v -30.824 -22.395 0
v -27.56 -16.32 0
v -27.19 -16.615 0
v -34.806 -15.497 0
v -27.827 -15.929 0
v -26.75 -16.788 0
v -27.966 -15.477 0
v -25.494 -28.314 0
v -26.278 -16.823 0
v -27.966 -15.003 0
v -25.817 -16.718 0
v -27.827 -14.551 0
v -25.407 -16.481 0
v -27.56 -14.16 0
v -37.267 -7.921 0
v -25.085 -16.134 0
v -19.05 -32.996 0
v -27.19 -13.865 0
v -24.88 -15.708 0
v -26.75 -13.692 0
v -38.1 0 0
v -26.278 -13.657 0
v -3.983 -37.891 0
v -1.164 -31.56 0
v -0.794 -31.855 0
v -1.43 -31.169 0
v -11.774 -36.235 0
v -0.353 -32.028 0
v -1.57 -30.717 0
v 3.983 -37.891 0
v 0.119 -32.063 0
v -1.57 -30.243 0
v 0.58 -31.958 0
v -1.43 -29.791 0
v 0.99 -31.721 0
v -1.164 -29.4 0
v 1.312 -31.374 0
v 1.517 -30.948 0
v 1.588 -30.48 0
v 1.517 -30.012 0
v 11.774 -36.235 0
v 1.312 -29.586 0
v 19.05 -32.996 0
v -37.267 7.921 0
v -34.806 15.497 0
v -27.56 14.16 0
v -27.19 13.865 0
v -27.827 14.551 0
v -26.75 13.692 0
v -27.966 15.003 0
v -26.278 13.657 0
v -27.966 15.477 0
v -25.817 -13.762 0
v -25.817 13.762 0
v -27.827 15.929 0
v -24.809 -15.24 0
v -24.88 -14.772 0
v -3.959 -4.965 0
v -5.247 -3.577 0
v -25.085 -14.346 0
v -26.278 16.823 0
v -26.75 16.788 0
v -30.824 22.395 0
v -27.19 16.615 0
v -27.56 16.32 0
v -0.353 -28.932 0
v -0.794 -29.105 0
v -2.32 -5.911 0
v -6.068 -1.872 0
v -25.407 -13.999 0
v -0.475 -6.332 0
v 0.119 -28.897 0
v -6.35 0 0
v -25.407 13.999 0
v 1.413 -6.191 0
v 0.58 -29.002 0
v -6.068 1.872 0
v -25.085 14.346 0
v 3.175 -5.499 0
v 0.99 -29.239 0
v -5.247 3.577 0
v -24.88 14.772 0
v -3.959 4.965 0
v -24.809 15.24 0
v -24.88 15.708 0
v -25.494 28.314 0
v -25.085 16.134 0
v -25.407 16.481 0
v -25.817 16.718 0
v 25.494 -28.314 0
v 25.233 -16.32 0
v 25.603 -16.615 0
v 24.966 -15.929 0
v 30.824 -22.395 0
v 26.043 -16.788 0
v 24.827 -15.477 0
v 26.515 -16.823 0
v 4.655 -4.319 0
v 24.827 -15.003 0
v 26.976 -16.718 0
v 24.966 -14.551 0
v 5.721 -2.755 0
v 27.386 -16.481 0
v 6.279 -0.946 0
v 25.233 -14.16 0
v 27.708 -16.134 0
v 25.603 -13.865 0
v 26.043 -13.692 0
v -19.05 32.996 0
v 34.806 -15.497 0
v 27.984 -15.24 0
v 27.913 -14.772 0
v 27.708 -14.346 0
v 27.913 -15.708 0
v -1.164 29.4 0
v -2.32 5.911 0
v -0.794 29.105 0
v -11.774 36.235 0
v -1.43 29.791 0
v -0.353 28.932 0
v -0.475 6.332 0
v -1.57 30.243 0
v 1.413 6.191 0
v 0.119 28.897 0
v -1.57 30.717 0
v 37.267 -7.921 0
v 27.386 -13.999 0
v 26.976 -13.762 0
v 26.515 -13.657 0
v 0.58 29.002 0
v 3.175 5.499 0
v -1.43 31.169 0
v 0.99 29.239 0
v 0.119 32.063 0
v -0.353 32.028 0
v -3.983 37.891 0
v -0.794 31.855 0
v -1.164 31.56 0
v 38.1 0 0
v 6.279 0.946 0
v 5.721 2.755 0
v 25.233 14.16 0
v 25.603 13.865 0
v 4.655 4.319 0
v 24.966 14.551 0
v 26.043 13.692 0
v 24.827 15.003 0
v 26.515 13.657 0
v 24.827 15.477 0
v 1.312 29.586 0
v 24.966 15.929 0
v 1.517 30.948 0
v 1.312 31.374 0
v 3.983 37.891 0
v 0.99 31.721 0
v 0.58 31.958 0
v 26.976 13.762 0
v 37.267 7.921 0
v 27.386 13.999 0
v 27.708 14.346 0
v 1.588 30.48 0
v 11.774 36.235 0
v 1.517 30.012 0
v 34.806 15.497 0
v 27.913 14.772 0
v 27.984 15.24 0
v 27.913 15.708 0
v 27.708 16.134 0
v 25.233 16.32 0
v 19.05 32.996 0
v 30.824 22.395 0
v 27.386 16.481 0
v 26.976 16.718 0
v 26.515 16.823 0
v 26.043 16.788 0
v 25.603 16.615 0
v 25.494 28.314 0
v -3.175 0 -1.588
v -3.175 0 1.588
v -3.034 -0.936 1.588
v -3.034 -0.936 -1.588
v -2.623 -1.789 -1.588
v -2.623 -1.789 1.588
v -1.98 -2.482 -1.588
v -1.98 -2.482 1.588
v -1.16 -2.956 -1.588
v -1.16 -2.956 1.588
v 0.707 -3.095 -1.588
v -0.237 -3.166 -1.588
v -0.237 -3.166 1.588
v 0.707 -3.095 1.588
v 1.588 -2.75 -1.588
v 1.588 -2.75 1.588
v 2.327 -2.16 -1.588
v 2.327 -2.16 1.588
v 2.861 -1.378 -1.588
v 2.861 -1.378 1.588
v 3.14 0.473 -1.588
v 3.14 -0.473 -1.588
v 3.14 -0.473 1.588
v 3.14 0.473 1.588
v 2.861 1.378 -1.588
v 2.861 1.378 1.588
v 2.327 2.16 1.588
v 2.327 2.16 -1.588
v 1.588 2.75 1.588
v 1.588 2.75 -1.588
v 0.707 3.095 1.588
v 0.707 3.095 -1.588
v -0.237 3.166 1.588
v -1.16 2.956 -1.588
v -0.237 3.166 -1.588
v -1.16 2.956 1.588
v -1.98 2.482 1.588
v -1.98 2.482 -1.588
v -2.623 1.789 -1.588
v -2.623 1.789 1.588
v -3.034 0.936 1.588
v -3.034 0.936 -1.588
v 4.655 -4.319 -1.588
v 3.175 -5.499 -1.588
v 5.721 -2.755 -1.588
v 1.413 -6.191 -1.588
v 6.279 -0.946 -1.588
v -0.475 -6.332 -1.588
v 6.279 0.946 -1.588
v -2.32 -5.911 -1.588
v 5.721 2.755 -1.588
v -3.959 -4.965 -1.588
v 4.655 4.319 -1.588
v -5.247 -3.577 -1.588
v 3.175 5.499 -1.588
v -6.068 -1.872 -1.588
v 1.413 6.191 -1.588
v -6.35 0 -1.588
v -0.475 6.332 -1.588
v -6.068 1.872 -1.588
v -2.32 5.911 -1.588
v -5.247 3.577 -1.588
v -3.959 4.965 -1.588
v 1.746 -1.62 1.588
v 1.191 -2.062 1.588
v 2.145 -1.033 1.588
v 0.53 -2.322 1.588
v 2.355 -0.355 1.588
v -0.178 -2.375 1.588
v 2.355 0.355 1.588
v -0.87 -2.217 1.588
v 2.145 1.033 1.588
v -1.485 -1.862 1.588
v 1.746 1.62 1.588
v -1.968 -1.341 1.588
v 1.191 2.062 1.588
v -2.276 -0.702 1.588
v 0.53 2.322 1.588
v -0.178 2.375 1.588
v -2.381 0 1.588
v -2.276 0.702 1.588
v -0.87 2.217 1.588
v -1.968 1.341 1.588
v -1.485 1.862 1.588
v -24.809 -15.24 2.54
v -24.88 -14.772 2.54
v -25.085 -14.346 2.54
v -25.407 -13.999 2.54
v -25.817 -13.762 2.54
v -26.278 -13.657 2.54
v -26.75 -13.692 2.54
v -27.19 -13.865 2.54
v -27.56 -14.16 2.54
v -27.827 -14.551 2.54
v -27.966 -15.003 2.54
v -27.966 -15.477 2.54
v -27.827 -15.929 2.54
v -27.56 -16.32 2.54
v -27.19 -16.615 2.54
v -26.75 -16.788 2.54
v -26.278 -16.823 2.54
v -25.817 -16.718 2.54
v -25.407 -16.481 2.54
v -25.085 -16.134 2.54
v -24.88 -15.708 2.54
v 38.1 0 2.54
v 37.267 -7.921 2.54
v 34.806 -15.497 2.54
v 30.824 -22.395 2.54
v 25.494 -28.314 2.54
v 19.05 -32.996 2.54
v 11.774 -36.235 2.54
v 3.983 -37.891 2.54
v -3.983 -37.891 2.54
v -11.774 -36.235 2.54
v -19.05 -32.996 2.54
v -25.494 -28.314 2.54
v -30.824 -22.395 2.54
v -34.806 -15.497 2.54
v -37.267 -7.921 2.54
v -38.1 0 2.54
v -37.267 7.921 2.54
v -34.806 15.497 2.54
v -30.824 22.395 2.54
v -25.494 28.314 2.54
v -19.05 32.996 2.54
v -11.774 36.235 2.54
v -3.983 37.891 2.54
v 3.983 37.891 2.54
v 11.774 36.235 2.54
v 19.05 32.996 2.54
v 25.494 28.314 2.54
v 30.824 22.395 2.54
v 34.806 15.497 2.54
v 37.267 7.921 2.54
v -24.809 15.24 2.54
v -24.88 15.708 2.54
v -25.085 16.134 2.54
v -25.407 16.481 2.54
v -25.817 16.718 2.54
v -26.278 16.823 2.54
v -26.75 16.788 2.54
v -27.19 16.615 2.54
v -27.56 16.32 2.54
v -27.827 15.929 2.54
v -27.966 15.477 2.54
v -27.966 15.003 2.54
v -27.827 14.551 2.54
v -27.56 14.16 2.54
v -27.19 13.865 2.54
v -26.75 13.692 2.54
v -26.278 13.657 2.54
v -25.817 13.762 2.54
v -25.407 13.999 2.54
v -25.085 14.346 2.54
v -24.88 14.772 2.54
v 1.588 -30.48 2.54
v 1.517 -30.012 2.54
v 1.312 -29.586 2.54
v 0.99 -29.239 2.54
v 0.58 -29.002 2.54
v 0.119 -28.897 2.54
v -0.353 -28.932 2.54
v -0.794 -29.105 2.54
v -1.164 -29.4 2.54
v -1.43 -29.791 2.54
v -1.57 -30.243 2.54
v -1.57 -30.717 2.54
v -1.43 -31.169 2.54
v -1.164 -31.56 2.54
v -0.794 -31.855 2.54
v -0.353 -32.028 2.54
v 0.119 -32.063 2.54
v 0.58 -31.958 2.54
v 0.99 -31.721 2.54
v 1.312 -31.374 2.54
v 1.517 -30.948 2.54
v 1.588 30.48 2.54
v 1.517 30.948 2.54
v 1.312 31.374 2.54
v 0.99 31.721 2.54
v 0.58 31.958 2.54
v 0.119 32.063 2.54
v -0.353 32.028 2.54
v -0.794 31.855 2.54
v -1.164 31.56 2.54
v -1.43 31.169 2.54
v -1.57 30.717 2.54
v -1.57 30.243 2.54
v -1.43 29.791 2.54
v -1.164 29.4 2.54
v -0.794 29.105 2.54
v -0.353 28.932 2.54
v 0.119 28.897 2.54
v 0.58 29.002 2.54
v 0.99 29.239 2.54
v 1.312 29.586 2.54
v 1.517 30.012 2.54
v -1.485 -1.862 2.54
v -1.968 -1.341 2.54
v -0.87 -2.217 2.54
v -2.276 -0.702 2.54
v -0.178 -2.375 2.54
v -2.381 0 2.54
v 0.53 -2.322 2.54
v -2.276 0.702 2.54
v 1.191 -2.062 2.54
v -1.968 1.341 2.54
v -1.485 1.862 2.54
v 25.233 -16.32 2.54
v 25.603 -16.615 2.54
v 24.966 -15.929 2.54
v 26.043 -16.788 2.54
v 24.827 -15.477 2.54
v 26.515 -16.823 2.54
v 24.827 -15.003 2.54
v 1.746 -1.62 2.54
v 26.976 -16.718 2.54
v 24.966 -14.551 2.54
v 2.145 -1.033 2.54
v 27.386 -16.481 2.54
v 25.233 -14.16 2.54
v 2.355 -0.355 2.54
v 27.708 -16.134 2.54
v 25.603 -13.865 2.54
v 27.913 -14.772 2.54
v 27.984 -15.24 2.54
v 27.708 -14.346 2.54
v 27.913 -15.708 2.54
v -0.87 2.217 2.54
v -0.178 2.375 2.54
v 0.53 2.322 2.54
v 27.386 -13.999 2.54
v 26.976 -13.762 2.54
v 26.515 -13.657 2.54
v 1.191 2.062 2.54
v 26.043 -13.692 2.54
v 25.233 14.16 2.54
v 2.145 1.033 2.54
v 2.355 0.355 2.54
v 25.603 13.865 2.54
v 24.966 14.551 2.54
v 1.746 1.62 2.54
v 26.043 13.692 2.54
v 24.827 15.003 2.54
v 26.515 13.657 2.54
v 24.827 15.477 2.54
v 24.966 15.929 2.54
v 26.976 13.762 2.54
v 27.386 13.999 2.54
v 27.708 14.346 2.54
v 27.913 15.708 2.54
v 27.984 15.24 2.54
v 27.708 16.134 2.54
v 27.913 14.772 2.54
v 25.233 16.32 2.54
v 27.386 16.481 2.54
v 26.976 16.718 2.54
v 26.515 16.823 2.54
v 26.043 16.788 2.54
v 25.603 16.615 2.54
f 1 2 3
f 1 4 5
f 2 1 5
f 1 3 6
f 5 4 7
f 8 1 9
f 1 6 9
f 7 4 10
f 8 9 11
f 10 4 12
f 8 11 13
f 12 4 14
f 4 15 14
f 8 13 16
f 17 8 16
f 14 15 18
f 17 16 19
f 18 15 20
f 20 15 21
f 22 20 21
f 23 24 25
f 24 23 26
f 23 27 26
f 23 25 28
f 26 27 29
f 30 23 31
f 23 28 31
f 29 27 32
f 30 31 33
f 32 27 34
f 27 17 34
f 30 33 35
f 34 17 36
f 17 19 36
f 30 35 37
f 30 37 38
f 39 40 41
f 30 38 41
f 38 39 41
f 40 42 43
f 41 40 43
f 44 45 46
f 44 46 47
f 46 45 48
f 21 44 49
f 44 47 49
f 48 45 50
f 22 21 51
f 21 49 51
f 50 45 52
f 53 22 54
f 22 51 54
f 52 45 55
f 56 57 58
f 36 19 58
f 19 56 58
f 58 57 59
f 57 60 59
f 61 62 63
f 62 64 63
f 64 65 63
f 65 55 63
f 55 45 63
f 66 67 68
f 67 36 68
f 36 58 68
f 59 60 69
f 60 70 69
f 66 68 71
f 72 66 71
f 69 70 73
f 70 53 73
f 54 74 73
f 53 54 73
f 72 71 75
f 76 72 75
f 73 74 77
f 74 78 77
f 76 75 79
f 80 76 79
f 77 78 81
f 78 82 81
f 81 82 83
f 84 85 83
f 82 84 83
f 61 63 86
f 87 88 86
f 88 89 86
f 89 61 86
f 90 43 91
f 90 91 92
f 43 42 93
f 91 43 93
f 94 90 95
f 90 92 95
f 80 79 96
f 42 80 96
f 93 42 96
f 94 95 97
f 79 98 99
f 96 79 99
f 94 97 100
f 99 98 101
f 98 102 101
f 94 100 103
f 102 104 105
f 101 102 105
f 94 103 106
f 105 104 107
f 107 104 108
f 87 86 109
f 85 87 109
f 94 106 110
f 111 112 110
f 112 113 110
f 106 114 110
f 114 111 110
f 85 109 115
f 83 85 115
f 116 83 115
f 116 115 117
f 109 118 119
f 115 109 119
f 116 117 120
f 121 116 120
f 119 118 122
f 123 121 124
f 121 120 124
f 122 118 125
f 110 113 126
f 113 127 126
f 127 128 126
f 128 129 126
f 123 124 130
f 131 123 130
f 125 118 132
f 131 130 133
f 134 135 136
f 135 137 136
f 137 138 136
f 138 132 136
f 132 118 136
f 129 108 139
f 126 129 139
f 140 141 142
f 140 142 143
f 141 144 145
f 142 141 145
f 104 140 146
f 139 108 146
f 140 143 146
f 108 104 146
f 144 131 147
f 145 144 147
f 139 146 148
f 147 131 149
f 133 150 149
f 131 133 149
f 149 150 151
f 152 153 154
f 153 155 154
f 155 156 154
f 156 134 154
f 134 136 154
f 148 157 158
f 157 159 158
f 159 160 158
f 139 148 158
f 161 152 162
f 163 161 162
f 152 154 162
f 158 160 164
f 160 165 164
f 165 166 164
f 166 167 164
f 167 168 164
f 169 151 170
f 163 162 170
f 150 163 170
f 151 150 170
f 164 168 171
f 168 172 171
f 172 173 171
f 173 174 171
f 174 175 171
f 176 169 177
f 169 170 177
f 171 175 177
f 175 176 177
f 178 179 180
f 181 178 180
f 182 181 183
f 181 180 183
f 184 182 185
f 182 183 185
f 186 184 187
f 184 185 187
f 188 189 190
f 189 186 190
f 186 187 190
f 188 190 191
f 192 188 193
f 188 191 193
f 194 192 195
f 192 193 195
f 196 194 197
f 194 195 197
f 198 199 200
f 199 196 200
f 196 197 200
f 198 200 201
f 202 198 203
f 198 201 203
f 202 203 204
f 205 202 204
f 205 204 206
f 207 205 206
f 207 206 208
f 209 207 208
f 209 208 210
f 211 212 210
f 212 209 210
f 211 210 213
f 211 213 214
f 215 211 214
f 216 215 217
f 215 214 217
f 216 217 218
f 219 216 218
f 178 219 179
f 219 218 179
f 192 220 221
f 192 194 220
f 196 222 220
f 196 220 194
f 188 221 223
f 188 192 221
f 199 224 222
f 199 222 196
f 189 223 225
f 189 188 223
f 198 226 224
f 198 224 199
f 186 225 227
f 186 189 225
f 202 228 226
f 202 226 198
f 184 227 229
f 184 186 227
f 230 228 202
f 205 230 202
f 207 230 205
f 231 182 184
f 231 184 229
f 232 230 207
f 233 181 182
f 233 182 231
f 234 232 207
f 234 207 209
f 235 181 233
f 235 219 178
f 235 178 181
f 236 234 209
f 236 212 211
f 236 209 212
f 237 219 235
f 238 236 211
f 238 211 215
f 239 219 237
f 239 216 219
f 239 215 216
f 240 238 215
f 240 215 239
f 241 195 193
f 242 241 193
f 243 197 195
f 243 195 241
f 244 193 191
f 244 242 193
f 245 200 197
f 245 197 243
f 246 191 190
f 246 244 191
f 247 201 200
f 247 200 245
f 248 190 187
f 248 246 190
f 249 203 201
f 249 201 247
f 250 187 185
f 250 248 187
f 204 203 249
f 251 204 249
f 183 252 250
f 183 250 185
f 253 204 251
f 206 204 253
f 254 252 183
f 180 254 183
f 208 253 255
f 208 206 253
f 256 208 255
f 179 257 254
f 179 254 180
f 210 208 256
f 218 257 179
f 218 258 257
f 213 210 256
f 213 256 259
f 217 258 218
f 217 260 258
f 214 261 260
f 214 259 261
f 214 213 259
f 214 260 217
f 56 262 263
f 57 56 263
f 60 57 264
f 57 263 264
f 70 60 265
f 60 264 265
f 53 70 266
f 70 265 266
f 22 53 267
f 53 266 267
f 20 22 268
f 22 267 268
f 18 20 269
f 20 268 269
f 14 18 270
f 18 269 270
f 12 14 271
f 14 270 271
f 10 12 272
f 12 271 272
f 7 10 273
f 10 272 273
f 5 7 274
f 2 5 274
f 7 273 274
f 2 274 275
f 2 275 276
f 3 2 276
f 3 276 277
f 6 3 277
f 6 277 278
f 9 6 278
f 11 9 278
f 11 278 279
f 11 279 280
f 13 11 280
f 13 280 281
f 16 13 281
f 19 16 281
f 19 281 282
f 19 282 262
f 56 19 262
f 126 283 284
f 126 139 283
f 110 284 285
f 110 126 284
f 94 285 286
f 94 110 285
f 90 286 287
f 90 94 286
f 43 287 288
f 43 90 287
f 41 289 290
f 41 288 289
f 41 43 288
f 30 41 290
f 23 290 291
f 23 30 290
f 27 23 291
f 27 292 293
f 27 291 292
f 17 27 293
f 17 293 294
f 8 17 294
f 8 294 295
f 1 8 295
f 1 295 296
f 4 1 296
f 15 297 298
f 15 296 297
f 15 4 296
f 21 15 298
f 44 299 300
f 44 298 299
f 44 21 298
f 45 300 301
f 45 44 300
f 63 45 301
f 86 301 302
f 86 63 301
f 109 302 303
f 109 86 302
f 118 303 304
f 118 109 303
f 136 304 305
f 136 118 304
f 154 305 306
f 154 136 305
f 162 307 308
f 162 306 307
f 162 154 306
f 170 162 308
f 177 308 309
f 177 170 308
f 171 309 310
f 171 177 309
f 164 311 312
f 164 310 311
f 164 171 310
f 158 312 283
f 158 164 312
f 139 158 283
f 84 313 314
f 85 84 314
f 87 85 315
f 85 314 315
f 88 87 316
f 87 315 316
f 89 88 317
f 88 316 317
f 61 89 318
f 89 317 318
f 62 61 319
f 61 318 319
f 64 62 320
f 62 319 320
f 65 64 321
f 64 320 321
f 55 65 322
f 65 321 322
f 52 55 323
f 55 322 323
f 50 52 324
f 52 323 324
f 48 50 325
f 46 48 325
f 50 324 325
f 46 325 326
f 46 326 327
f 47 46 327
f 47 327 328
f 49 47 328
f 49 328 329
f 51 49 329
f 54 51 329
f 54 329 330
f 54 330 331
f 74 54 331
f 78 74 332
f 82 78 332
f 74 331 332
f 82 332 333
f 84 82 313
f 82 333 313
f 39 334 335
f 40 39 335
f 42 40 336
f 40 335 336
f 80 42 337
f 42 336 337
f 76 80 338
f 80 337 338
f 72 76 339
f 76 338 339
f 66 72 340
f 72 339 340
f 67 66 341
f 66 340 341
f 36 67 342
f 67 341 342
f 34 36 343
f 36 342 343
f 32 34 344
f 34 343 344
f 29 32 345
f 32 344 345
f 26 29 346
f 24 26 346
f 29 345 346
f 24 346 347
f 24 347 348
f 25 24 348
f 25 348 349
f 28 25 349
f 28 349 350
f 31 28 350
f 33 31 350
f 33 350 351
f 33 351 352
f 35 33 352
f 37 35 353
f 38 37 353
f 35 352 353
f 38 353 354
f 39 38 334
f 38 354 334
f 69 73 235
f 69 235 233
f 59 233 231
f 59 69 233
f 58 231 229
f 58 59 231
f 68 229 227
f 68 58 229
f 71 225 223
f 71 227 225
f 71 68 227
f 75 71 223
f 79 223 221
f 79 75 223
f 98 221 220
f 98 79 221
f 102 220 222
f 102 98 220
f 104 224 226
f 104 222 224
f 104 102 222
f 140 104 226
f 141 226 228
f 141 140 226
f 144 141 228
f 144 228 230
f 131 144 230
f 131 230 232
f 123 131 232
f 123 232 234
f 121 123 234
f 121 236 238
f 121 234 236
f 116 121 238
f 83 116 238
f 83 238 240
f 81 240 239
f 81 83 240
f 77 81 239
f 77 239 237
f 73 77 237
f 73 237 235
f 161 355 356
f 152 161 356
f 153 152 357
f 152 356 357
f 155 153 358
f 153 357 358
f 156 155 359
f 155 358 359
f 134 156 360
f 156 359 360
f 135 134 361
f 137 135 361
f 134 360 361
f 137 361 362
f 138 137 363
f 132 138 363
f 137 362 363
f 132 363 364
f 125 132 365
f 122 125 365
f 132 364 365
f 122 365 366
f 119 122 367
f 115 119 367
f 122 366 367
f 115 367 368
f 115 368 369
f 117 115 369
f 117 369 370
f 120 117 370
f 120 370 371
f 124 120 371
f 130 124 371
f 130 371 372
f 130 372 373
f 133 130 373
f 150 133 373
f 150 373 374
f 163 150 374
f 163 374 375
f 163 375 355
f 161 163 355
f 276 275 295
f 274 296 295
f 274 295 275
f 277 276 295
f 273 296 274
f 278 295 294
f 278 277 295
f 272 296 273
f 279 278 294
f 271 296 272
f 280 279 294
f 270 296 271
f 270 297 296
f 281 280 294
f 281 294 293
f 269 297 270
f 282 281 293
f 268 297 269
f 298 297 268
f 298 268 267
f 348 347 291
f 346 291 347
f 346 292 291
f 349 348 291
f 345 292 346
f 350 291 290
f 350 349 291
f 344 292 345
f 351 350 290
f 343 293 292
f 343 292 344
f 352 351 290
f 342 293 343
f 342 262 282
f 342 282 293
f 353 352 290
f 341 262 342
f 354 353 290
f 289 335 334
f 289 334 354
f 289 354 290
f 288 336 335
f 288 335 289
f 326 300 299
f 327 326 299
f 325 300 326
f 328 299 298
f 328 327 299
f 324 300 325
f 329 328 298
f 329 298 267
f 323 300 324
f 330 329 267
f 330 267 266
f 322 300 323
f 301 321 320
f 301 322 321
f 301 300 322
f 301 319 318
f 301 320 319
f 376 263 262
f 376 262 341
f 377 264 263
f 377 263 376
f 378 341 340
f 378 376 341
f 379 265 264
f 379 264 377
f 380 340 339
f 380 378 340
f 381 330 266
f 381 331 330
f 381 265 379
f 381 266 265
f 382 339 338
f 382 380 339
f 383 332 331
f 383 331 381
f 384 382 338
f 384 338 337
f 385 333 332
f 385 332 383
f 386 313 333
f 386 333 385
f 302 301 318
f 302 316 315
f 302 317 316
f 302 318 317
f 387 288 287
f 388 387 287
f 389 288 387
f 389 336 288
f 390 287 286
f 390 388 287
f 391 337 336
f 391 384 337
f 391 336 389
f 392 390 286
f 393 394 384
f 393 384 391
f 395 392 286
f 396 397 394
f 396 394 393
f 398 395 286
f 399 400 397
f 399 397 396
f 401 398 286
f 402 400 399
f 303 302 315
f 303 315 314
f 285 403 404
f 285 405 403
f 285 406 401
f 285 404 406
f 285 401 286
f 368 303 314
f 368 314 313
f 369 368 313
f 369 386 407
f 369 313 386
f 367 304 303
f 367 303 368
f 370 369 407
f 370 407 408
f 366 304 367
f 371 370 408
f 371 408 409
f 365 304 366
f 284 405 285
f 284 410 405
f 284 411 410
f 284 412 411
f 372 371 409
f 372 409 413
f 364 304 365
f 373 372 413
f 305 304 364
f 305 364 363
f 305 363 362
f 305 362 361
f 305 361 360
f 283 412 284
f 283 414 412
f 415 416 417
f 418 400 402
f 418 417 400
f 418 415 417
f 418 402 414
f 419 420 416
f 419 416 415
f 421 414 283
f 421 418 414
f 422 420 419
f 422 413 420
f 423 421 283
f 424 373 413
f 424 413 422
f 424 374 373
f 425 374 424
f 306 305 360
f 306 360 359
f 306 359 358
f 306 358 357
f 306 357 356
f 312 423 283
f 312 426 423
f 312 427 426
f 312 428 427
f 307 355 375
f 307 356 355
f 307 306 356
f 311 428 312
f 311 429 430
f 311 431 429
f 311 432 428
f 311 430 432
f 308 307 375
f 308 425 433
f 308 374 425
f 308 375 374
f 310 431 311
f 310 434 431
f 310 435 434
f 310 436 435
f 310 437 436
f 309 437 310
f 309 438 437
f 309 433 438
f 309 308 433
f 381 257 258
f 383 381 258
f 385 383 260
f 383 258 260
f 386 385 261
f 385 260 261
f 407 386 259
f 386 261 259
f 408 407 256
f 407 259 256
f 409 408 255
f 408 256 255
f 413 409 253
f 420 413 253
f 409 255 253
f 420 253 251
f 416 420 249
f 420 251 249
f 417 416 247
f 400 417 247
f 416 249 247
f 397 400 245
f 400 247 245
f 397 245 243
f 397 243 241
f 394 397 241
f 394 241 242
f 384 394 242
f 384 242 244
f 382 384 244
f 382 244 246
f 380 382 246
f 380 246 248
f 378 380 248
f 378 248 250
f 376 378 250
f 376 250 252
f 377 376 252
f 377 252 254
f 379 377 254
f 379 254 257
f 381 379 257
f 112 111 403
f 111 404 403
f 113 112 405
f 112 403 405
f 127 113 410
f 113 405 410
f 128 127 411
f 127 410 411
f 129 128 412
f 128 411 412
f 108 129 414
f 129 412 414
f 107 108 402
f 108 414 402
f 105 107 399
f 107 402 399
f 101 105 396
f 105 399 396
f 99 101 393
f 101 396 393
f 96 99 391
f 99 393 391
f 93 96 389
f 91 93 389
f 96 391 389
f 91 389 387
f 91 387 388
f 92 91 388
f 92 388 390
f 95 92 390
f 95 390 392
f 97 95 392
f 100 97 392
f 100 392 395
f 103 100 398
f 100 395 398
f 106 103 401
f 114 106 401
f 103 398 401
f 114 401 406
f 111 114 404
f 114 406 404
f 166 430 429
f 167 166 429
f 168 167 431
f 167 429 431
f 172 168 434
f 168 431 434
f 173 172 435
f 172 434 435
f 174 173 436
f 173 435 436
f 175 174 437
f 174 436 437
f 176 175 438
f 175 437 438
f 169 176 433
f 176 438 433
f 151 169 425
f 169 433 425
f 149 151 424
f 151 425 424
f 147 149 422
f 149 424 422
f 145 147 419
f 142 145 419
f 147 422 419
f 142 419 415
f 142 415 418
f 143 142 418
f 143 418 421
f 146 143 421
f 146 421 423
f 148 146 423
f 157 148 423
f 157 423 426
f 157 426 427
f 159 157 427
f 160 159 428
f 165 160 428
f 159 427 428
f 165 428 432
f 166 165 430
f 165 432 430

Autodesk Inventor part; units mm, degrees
ref_plane "YZ Plane" through (0, 0, 0) normal (1, 0, 0) x (0, 1, 0)
ref_plane "XZ Plane" through (0, 0, 0) normal (0, 1, 0) x (-1, 0, 0)
ref_plane "XY Plane" through (0, 0, 0) normal (0, 0, 1) x (1, 0, 0)
sketch "Sketch1" plane through (0, 0, 0) normal (0, 0, 1) x (1, 0, 0)
  circle A0 centre (0, 0) radius 38.1
  dimension "d0" = 76.2
extrude "Extrusion1" add sketch "Sketch1" along normal blind 2.54
sketch "Sketch3" plane through (0, 0, 0) normal (0, 0, -1) x (-1, 0, 0)
  circle A0 centre (0, 0) radius 3.175
  circle A1 centre (0, 0) radius 6.35
  circle A2 centre (0, 0) radius 2.3813
  dimension "d4" = 6.35
  dimension "d5" = 12.7
  dimension "d6" = 4.7625
extrude "Extrusion2" cut sketch "Sketch3" against normal blind 25.4 contours A2
extrude "Extrusion3" cut sketch "Sketch3" against normal blind 1.5875 contours A0
extrude "Extrusion4" add sketch "Sketch3" along normal blind 1.5875 contours A1
sketch "Sketch4" plane through (0, 0, 2.54) normal (0, 0, 1) x (1, 0, 0)
  line L0 (0, 0) -> (0, 30.48)
  circle A0 centre (0, 30.48) radius 1.5875
  circle A1 centre (-26.3965, 15.24) radius 1.5875
  circle A2 centre (-26.3965, -15.24) radius 1.5875
  circle A3 centre (0, -30.48) radius 1.5875
  circle A4 centre (26.3965, -15.24) radius 1.5875
  circle A5 centre (26.3965, 15.24) radius 1.5875
  dimension "d13" = 30.48
  dimension "d14" = 3.175
  dimension "d17" = 360
extrude "Extrusion5" cut sketch "Sketch4" against normal blind 25.4
properties part number "SpoolEndFrontSide"
